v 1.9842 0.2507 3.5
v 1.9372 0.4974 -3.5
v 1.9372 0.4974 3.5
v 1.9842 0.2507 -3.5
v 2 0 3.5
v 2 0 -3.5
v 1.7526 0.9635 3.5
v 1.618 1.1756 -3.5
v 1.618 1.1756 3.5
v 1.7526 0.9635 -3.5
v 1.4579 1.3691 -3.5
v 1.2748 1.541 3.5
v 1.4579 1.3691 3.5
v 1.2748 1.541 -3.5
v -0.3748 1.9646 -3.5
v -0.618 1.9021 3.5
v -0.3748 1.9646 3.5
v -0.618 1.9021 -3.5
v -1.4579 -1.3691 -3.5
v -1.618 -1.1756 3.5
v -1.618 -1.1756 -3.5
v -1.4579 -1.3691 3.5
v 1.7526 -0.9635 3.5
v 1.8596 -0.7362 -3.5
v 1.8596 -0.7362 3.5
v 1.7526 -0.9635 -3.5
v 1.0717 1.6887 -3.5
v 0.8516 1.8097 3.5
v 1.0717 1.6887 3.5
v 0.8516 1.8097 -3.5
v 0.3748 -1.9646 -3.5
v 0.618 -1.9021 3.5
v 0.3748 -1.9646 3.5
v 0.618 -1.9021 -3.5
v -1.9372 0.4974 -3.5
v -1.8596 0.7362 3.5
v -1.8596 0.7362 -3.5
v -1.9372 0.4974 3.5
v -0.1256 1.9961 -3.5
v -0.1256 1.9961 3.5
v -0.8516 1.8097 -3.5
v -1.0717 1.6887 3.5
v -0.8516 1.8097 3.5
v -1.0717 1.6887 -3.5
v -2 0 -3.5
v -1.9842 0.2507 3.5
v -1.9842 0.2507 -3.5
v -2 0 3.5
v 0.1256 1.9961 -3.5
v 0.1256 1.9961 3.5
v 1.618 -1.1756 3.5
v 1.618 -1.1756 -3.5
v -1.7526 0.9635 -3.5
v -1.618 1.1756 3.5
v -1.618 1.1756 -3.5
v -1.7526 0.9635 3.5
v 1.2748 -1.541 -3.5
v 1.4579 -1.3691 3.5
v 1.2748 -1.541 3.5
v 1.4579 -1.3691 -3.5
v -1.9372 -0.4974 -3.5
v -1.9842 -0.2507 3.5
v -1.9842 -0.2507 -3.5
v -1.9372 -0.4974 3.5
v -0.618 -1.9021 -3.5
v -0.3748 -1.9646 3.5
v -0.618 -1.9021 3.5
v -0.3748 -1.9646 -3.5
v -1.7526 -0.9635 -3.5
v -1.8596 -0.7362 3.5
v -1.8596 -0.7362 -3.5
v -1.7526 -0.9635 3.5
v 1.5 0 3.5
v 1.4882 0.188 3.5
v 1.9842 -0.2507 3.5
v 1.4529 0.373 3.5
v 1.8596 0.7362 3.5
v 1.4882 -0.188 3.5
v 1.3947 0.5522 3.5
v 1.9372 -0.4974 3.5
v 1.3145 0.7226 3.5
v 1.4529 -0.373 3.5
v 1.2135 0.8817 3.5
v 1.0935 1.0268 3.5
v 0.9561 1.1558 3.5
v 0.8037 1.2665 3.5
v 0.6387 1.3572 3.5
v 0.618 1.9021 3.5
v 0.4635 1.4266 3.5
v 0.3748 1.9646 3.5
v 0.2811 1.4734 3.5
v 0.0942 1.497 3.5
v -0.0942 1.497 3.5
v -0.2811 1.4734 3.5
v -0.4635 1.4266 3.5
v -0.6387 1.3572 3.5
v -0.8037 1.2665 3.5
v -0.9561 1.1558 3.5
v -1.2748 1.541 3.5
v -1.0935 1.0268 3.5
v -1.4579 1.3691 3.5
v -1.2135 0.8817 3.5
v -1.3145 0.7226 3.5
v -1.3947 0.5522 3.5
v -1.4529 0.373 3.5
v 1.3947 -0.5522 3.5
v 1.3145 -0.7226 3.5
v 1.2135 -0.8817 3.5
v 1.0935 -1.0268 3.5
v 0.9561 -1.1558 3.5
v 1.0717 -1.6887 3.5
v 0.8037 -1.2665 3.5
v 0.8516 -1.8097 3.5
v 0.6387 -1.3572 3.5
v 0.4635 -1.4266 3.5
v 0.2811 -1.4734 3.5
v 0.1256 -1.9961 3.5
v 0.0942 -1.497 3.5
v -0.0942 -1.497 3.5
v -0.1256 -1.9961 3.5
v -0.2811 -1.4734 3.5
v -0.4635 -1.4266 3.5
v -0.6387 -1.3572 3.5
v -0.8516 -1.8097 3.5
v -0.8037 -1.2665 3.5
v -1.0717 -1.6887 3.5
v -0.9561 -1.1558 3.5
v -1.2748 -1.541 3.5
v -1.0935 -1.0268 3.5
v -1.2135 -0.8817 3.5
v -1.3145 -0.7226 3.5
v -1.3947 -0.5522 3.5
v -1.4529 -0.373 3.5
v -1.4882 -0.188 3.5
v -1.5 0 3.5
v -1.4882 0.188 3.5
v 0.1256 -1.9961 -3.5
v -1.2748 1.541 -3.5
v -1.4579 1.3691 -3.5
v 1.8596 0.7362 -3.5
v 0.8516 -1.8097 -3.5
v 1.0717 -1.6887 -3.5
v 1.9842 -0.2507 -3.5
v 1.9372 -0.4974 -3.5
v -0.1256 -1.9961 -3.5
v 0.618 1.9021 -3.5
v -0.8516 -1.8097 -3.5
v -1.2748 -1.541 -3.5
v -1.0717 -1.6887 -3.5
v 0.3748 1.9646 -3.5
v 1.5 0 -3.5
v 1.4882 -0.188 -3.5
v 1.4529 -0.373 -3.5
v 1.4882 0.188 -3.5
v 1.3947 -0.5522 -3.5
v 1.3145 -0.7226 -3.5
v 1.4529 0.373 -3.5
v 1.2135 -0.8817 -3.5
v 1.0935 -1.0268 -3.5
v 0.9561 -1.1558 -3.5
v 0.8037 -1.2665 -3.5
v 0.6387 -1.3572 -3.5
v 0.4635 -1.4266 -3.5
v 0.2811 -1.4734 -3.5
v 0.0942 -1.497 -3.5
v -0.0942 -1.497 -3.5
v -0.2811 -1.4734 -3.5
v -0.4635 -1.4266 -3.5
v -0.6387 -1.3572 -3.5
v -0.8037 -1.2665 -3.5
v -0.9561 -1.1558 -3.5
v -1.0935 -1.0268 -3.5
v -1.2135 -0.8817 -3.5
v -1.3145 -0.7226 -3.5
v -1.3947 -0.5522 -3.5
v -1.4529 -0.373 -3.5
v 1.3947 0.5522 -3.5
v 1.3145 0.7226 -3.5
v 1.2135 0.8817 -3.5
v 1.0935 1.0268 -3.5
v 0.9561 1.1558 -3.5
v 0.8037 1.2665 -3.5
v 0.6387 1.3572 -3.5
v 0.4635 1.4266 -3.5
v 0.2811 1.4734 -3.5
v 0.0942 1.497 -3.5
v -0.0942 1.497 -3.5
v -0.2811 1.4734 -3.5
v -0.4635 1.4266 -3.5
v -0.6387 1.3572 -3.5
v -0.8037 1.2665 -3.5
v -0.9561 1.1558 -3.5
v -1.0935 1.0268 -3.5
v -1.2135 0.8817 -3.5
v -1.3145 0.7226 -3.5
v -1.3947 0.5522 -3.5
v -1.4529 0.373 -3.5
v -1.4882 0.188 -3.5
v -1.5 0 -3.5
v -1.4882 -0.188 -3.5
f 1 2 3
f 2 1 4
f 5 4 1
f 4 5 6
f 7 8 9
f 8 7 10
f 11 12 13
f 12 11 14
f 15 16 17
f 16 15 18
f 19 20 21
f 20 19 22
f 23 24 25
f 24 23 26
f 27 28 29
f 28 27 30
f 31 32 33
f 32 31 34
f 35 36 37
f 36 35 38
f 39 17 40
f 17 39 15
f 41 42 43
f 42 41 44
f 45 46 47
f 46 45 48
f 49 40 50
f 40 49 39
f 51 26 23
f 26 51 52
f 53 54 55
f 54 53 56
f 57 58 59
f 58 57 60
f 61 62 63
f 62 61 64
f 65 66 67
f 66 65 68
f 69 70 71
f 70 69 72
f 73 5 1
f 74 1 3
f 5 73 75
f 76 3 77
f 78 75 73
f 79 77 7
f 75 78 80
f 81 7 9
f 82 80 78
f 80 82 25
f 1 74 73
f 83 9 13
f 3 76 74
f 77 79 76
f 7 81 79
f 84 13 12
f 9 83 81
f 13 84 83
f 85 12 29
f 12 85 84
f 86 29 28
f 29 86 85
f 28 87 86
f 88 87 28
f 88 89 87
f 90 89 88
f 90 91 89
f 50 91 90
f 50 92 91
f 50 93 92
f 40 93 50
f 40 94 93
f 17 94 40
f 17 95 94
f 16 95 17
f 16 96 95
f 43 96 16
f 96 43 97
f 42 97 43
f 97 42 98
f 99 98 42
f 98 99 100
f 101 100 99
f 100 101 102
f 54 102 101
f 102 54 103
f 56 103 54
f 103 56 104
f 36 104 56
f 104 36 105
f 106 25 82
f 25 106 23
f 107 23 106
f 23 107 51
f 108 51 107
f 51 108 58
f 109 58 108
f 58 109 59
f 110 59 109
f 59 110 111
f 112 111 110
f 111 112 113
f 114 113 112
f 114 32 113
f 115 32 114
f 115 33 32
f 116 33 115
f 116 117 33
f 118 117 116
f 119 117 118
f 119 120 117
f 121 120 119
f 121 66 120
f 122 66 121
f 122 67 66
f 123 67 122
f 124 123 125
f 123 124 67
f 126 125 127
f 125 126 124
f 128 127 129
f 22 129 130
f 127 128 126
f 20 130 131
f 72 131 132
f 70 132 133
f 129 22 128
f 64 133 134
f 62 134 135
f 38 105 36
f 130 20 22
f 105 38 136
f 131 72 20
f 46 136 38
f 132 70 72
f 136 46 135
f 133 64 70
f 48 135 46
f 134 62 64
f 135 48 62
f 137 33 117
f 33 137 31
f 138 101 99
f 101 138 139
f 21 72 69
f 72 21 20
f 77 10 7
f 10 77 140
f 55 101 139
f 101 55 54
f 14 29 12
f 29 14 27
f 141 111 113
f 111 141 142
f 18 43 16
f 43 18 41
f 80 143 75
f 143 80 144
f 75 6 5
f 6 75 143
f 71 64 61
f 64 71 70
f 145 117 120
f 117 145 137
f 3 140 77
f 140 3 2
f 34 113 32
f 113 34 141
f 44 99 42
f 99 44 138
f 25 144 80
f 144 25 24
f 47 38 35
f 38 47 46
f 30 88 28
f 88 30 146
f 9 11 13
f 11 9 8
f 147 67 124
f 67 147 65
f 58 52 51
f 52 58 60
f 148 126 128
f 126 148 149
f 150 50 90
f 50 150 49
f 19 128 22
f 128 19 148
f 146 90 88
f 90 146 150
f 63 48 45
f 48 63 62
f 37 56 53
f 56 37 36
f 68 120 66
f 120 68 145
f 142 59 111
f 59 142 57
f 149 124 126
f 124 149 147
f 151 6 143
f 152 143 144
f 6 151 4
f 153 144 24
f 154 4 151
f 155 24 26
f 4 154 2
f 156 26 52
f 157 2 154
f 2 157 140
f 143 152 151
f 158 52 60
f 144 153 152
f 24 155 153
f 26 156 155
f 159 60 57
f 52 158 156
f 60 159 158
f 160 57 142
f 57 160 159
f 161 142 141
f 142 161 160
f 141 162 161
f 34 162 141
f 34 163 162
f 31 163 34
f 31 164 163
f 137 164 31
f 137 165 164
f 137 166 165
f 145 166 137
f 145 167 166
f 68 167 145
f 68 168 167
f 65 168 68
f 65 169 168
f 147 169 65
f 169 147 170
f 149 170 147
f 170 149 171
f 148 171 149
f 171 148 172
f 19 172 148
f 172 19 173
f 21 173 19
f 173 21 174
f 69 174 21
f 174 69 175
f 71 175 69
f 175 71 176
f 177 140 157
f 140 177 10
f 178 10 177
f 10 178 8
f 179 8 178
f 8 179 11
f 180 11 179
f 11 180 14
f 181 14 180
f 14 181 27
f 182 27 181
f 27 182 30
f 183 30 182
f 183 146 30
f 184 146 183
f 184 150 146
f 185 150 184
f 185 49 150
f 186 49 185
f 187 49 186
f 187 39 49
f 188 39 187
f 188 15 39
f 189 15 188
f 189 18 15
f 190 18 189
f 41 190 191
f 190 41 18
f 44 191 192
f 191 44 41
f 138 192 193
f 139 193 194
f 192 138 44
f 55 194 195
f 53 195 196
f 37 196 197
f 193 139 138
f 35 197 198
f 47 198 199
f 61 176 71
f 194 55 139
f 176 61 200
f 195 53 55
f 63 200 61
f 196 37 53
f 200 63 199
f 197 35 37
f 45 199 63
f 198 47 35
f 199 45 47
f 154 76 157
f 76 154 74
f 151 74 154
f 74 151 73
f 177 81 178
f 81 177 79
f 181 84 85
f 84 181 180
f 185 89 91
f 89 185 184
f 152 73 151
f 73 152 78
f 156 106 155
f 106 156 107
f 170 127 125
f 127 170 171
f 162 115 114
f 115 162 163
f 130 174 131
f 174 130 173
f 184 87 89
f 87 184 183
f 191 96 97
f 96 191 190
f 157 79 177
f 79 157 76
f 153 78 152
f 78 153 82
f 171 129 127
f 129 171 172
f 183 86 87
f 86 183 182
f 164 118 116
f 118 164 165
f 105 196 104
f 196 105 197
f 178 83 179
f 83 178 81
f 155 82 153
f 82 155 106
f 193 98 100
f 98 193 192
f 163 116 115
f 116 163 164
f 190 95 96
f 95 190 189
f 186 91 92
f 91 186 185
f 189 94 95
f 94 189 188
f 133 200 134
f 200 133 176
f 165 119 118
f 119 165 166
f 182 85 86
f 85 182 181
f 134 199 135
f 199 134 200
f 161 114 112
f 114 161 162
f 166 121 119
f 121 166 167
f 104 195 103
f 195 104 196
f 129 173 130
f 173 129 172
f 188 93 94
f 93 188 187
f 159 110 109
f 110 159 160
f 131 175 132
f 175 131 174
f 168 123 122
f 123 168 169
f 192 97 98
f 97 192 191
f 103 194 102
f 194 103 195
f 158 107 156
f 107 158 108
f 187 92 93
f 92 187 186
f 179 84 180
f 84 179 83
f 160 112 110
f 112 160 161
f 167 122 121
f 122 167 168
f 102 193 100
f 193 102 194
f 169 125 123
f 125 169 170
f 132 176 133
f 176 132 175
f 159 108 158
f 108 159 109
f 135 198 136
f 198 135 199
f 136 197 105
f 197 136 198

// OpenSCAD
$fn = 50;


difference() {
	union() {
		translate(v = [0, 0, -3.5000000000]) {
			cylinder(h = 7, r = 2.0000000000);
		}
	}
	union() {
		translate(v = [0, 0, -100.0000000000]) {
			cylinder(h = 200, r = 1.5000000000);
		}
	}
}
